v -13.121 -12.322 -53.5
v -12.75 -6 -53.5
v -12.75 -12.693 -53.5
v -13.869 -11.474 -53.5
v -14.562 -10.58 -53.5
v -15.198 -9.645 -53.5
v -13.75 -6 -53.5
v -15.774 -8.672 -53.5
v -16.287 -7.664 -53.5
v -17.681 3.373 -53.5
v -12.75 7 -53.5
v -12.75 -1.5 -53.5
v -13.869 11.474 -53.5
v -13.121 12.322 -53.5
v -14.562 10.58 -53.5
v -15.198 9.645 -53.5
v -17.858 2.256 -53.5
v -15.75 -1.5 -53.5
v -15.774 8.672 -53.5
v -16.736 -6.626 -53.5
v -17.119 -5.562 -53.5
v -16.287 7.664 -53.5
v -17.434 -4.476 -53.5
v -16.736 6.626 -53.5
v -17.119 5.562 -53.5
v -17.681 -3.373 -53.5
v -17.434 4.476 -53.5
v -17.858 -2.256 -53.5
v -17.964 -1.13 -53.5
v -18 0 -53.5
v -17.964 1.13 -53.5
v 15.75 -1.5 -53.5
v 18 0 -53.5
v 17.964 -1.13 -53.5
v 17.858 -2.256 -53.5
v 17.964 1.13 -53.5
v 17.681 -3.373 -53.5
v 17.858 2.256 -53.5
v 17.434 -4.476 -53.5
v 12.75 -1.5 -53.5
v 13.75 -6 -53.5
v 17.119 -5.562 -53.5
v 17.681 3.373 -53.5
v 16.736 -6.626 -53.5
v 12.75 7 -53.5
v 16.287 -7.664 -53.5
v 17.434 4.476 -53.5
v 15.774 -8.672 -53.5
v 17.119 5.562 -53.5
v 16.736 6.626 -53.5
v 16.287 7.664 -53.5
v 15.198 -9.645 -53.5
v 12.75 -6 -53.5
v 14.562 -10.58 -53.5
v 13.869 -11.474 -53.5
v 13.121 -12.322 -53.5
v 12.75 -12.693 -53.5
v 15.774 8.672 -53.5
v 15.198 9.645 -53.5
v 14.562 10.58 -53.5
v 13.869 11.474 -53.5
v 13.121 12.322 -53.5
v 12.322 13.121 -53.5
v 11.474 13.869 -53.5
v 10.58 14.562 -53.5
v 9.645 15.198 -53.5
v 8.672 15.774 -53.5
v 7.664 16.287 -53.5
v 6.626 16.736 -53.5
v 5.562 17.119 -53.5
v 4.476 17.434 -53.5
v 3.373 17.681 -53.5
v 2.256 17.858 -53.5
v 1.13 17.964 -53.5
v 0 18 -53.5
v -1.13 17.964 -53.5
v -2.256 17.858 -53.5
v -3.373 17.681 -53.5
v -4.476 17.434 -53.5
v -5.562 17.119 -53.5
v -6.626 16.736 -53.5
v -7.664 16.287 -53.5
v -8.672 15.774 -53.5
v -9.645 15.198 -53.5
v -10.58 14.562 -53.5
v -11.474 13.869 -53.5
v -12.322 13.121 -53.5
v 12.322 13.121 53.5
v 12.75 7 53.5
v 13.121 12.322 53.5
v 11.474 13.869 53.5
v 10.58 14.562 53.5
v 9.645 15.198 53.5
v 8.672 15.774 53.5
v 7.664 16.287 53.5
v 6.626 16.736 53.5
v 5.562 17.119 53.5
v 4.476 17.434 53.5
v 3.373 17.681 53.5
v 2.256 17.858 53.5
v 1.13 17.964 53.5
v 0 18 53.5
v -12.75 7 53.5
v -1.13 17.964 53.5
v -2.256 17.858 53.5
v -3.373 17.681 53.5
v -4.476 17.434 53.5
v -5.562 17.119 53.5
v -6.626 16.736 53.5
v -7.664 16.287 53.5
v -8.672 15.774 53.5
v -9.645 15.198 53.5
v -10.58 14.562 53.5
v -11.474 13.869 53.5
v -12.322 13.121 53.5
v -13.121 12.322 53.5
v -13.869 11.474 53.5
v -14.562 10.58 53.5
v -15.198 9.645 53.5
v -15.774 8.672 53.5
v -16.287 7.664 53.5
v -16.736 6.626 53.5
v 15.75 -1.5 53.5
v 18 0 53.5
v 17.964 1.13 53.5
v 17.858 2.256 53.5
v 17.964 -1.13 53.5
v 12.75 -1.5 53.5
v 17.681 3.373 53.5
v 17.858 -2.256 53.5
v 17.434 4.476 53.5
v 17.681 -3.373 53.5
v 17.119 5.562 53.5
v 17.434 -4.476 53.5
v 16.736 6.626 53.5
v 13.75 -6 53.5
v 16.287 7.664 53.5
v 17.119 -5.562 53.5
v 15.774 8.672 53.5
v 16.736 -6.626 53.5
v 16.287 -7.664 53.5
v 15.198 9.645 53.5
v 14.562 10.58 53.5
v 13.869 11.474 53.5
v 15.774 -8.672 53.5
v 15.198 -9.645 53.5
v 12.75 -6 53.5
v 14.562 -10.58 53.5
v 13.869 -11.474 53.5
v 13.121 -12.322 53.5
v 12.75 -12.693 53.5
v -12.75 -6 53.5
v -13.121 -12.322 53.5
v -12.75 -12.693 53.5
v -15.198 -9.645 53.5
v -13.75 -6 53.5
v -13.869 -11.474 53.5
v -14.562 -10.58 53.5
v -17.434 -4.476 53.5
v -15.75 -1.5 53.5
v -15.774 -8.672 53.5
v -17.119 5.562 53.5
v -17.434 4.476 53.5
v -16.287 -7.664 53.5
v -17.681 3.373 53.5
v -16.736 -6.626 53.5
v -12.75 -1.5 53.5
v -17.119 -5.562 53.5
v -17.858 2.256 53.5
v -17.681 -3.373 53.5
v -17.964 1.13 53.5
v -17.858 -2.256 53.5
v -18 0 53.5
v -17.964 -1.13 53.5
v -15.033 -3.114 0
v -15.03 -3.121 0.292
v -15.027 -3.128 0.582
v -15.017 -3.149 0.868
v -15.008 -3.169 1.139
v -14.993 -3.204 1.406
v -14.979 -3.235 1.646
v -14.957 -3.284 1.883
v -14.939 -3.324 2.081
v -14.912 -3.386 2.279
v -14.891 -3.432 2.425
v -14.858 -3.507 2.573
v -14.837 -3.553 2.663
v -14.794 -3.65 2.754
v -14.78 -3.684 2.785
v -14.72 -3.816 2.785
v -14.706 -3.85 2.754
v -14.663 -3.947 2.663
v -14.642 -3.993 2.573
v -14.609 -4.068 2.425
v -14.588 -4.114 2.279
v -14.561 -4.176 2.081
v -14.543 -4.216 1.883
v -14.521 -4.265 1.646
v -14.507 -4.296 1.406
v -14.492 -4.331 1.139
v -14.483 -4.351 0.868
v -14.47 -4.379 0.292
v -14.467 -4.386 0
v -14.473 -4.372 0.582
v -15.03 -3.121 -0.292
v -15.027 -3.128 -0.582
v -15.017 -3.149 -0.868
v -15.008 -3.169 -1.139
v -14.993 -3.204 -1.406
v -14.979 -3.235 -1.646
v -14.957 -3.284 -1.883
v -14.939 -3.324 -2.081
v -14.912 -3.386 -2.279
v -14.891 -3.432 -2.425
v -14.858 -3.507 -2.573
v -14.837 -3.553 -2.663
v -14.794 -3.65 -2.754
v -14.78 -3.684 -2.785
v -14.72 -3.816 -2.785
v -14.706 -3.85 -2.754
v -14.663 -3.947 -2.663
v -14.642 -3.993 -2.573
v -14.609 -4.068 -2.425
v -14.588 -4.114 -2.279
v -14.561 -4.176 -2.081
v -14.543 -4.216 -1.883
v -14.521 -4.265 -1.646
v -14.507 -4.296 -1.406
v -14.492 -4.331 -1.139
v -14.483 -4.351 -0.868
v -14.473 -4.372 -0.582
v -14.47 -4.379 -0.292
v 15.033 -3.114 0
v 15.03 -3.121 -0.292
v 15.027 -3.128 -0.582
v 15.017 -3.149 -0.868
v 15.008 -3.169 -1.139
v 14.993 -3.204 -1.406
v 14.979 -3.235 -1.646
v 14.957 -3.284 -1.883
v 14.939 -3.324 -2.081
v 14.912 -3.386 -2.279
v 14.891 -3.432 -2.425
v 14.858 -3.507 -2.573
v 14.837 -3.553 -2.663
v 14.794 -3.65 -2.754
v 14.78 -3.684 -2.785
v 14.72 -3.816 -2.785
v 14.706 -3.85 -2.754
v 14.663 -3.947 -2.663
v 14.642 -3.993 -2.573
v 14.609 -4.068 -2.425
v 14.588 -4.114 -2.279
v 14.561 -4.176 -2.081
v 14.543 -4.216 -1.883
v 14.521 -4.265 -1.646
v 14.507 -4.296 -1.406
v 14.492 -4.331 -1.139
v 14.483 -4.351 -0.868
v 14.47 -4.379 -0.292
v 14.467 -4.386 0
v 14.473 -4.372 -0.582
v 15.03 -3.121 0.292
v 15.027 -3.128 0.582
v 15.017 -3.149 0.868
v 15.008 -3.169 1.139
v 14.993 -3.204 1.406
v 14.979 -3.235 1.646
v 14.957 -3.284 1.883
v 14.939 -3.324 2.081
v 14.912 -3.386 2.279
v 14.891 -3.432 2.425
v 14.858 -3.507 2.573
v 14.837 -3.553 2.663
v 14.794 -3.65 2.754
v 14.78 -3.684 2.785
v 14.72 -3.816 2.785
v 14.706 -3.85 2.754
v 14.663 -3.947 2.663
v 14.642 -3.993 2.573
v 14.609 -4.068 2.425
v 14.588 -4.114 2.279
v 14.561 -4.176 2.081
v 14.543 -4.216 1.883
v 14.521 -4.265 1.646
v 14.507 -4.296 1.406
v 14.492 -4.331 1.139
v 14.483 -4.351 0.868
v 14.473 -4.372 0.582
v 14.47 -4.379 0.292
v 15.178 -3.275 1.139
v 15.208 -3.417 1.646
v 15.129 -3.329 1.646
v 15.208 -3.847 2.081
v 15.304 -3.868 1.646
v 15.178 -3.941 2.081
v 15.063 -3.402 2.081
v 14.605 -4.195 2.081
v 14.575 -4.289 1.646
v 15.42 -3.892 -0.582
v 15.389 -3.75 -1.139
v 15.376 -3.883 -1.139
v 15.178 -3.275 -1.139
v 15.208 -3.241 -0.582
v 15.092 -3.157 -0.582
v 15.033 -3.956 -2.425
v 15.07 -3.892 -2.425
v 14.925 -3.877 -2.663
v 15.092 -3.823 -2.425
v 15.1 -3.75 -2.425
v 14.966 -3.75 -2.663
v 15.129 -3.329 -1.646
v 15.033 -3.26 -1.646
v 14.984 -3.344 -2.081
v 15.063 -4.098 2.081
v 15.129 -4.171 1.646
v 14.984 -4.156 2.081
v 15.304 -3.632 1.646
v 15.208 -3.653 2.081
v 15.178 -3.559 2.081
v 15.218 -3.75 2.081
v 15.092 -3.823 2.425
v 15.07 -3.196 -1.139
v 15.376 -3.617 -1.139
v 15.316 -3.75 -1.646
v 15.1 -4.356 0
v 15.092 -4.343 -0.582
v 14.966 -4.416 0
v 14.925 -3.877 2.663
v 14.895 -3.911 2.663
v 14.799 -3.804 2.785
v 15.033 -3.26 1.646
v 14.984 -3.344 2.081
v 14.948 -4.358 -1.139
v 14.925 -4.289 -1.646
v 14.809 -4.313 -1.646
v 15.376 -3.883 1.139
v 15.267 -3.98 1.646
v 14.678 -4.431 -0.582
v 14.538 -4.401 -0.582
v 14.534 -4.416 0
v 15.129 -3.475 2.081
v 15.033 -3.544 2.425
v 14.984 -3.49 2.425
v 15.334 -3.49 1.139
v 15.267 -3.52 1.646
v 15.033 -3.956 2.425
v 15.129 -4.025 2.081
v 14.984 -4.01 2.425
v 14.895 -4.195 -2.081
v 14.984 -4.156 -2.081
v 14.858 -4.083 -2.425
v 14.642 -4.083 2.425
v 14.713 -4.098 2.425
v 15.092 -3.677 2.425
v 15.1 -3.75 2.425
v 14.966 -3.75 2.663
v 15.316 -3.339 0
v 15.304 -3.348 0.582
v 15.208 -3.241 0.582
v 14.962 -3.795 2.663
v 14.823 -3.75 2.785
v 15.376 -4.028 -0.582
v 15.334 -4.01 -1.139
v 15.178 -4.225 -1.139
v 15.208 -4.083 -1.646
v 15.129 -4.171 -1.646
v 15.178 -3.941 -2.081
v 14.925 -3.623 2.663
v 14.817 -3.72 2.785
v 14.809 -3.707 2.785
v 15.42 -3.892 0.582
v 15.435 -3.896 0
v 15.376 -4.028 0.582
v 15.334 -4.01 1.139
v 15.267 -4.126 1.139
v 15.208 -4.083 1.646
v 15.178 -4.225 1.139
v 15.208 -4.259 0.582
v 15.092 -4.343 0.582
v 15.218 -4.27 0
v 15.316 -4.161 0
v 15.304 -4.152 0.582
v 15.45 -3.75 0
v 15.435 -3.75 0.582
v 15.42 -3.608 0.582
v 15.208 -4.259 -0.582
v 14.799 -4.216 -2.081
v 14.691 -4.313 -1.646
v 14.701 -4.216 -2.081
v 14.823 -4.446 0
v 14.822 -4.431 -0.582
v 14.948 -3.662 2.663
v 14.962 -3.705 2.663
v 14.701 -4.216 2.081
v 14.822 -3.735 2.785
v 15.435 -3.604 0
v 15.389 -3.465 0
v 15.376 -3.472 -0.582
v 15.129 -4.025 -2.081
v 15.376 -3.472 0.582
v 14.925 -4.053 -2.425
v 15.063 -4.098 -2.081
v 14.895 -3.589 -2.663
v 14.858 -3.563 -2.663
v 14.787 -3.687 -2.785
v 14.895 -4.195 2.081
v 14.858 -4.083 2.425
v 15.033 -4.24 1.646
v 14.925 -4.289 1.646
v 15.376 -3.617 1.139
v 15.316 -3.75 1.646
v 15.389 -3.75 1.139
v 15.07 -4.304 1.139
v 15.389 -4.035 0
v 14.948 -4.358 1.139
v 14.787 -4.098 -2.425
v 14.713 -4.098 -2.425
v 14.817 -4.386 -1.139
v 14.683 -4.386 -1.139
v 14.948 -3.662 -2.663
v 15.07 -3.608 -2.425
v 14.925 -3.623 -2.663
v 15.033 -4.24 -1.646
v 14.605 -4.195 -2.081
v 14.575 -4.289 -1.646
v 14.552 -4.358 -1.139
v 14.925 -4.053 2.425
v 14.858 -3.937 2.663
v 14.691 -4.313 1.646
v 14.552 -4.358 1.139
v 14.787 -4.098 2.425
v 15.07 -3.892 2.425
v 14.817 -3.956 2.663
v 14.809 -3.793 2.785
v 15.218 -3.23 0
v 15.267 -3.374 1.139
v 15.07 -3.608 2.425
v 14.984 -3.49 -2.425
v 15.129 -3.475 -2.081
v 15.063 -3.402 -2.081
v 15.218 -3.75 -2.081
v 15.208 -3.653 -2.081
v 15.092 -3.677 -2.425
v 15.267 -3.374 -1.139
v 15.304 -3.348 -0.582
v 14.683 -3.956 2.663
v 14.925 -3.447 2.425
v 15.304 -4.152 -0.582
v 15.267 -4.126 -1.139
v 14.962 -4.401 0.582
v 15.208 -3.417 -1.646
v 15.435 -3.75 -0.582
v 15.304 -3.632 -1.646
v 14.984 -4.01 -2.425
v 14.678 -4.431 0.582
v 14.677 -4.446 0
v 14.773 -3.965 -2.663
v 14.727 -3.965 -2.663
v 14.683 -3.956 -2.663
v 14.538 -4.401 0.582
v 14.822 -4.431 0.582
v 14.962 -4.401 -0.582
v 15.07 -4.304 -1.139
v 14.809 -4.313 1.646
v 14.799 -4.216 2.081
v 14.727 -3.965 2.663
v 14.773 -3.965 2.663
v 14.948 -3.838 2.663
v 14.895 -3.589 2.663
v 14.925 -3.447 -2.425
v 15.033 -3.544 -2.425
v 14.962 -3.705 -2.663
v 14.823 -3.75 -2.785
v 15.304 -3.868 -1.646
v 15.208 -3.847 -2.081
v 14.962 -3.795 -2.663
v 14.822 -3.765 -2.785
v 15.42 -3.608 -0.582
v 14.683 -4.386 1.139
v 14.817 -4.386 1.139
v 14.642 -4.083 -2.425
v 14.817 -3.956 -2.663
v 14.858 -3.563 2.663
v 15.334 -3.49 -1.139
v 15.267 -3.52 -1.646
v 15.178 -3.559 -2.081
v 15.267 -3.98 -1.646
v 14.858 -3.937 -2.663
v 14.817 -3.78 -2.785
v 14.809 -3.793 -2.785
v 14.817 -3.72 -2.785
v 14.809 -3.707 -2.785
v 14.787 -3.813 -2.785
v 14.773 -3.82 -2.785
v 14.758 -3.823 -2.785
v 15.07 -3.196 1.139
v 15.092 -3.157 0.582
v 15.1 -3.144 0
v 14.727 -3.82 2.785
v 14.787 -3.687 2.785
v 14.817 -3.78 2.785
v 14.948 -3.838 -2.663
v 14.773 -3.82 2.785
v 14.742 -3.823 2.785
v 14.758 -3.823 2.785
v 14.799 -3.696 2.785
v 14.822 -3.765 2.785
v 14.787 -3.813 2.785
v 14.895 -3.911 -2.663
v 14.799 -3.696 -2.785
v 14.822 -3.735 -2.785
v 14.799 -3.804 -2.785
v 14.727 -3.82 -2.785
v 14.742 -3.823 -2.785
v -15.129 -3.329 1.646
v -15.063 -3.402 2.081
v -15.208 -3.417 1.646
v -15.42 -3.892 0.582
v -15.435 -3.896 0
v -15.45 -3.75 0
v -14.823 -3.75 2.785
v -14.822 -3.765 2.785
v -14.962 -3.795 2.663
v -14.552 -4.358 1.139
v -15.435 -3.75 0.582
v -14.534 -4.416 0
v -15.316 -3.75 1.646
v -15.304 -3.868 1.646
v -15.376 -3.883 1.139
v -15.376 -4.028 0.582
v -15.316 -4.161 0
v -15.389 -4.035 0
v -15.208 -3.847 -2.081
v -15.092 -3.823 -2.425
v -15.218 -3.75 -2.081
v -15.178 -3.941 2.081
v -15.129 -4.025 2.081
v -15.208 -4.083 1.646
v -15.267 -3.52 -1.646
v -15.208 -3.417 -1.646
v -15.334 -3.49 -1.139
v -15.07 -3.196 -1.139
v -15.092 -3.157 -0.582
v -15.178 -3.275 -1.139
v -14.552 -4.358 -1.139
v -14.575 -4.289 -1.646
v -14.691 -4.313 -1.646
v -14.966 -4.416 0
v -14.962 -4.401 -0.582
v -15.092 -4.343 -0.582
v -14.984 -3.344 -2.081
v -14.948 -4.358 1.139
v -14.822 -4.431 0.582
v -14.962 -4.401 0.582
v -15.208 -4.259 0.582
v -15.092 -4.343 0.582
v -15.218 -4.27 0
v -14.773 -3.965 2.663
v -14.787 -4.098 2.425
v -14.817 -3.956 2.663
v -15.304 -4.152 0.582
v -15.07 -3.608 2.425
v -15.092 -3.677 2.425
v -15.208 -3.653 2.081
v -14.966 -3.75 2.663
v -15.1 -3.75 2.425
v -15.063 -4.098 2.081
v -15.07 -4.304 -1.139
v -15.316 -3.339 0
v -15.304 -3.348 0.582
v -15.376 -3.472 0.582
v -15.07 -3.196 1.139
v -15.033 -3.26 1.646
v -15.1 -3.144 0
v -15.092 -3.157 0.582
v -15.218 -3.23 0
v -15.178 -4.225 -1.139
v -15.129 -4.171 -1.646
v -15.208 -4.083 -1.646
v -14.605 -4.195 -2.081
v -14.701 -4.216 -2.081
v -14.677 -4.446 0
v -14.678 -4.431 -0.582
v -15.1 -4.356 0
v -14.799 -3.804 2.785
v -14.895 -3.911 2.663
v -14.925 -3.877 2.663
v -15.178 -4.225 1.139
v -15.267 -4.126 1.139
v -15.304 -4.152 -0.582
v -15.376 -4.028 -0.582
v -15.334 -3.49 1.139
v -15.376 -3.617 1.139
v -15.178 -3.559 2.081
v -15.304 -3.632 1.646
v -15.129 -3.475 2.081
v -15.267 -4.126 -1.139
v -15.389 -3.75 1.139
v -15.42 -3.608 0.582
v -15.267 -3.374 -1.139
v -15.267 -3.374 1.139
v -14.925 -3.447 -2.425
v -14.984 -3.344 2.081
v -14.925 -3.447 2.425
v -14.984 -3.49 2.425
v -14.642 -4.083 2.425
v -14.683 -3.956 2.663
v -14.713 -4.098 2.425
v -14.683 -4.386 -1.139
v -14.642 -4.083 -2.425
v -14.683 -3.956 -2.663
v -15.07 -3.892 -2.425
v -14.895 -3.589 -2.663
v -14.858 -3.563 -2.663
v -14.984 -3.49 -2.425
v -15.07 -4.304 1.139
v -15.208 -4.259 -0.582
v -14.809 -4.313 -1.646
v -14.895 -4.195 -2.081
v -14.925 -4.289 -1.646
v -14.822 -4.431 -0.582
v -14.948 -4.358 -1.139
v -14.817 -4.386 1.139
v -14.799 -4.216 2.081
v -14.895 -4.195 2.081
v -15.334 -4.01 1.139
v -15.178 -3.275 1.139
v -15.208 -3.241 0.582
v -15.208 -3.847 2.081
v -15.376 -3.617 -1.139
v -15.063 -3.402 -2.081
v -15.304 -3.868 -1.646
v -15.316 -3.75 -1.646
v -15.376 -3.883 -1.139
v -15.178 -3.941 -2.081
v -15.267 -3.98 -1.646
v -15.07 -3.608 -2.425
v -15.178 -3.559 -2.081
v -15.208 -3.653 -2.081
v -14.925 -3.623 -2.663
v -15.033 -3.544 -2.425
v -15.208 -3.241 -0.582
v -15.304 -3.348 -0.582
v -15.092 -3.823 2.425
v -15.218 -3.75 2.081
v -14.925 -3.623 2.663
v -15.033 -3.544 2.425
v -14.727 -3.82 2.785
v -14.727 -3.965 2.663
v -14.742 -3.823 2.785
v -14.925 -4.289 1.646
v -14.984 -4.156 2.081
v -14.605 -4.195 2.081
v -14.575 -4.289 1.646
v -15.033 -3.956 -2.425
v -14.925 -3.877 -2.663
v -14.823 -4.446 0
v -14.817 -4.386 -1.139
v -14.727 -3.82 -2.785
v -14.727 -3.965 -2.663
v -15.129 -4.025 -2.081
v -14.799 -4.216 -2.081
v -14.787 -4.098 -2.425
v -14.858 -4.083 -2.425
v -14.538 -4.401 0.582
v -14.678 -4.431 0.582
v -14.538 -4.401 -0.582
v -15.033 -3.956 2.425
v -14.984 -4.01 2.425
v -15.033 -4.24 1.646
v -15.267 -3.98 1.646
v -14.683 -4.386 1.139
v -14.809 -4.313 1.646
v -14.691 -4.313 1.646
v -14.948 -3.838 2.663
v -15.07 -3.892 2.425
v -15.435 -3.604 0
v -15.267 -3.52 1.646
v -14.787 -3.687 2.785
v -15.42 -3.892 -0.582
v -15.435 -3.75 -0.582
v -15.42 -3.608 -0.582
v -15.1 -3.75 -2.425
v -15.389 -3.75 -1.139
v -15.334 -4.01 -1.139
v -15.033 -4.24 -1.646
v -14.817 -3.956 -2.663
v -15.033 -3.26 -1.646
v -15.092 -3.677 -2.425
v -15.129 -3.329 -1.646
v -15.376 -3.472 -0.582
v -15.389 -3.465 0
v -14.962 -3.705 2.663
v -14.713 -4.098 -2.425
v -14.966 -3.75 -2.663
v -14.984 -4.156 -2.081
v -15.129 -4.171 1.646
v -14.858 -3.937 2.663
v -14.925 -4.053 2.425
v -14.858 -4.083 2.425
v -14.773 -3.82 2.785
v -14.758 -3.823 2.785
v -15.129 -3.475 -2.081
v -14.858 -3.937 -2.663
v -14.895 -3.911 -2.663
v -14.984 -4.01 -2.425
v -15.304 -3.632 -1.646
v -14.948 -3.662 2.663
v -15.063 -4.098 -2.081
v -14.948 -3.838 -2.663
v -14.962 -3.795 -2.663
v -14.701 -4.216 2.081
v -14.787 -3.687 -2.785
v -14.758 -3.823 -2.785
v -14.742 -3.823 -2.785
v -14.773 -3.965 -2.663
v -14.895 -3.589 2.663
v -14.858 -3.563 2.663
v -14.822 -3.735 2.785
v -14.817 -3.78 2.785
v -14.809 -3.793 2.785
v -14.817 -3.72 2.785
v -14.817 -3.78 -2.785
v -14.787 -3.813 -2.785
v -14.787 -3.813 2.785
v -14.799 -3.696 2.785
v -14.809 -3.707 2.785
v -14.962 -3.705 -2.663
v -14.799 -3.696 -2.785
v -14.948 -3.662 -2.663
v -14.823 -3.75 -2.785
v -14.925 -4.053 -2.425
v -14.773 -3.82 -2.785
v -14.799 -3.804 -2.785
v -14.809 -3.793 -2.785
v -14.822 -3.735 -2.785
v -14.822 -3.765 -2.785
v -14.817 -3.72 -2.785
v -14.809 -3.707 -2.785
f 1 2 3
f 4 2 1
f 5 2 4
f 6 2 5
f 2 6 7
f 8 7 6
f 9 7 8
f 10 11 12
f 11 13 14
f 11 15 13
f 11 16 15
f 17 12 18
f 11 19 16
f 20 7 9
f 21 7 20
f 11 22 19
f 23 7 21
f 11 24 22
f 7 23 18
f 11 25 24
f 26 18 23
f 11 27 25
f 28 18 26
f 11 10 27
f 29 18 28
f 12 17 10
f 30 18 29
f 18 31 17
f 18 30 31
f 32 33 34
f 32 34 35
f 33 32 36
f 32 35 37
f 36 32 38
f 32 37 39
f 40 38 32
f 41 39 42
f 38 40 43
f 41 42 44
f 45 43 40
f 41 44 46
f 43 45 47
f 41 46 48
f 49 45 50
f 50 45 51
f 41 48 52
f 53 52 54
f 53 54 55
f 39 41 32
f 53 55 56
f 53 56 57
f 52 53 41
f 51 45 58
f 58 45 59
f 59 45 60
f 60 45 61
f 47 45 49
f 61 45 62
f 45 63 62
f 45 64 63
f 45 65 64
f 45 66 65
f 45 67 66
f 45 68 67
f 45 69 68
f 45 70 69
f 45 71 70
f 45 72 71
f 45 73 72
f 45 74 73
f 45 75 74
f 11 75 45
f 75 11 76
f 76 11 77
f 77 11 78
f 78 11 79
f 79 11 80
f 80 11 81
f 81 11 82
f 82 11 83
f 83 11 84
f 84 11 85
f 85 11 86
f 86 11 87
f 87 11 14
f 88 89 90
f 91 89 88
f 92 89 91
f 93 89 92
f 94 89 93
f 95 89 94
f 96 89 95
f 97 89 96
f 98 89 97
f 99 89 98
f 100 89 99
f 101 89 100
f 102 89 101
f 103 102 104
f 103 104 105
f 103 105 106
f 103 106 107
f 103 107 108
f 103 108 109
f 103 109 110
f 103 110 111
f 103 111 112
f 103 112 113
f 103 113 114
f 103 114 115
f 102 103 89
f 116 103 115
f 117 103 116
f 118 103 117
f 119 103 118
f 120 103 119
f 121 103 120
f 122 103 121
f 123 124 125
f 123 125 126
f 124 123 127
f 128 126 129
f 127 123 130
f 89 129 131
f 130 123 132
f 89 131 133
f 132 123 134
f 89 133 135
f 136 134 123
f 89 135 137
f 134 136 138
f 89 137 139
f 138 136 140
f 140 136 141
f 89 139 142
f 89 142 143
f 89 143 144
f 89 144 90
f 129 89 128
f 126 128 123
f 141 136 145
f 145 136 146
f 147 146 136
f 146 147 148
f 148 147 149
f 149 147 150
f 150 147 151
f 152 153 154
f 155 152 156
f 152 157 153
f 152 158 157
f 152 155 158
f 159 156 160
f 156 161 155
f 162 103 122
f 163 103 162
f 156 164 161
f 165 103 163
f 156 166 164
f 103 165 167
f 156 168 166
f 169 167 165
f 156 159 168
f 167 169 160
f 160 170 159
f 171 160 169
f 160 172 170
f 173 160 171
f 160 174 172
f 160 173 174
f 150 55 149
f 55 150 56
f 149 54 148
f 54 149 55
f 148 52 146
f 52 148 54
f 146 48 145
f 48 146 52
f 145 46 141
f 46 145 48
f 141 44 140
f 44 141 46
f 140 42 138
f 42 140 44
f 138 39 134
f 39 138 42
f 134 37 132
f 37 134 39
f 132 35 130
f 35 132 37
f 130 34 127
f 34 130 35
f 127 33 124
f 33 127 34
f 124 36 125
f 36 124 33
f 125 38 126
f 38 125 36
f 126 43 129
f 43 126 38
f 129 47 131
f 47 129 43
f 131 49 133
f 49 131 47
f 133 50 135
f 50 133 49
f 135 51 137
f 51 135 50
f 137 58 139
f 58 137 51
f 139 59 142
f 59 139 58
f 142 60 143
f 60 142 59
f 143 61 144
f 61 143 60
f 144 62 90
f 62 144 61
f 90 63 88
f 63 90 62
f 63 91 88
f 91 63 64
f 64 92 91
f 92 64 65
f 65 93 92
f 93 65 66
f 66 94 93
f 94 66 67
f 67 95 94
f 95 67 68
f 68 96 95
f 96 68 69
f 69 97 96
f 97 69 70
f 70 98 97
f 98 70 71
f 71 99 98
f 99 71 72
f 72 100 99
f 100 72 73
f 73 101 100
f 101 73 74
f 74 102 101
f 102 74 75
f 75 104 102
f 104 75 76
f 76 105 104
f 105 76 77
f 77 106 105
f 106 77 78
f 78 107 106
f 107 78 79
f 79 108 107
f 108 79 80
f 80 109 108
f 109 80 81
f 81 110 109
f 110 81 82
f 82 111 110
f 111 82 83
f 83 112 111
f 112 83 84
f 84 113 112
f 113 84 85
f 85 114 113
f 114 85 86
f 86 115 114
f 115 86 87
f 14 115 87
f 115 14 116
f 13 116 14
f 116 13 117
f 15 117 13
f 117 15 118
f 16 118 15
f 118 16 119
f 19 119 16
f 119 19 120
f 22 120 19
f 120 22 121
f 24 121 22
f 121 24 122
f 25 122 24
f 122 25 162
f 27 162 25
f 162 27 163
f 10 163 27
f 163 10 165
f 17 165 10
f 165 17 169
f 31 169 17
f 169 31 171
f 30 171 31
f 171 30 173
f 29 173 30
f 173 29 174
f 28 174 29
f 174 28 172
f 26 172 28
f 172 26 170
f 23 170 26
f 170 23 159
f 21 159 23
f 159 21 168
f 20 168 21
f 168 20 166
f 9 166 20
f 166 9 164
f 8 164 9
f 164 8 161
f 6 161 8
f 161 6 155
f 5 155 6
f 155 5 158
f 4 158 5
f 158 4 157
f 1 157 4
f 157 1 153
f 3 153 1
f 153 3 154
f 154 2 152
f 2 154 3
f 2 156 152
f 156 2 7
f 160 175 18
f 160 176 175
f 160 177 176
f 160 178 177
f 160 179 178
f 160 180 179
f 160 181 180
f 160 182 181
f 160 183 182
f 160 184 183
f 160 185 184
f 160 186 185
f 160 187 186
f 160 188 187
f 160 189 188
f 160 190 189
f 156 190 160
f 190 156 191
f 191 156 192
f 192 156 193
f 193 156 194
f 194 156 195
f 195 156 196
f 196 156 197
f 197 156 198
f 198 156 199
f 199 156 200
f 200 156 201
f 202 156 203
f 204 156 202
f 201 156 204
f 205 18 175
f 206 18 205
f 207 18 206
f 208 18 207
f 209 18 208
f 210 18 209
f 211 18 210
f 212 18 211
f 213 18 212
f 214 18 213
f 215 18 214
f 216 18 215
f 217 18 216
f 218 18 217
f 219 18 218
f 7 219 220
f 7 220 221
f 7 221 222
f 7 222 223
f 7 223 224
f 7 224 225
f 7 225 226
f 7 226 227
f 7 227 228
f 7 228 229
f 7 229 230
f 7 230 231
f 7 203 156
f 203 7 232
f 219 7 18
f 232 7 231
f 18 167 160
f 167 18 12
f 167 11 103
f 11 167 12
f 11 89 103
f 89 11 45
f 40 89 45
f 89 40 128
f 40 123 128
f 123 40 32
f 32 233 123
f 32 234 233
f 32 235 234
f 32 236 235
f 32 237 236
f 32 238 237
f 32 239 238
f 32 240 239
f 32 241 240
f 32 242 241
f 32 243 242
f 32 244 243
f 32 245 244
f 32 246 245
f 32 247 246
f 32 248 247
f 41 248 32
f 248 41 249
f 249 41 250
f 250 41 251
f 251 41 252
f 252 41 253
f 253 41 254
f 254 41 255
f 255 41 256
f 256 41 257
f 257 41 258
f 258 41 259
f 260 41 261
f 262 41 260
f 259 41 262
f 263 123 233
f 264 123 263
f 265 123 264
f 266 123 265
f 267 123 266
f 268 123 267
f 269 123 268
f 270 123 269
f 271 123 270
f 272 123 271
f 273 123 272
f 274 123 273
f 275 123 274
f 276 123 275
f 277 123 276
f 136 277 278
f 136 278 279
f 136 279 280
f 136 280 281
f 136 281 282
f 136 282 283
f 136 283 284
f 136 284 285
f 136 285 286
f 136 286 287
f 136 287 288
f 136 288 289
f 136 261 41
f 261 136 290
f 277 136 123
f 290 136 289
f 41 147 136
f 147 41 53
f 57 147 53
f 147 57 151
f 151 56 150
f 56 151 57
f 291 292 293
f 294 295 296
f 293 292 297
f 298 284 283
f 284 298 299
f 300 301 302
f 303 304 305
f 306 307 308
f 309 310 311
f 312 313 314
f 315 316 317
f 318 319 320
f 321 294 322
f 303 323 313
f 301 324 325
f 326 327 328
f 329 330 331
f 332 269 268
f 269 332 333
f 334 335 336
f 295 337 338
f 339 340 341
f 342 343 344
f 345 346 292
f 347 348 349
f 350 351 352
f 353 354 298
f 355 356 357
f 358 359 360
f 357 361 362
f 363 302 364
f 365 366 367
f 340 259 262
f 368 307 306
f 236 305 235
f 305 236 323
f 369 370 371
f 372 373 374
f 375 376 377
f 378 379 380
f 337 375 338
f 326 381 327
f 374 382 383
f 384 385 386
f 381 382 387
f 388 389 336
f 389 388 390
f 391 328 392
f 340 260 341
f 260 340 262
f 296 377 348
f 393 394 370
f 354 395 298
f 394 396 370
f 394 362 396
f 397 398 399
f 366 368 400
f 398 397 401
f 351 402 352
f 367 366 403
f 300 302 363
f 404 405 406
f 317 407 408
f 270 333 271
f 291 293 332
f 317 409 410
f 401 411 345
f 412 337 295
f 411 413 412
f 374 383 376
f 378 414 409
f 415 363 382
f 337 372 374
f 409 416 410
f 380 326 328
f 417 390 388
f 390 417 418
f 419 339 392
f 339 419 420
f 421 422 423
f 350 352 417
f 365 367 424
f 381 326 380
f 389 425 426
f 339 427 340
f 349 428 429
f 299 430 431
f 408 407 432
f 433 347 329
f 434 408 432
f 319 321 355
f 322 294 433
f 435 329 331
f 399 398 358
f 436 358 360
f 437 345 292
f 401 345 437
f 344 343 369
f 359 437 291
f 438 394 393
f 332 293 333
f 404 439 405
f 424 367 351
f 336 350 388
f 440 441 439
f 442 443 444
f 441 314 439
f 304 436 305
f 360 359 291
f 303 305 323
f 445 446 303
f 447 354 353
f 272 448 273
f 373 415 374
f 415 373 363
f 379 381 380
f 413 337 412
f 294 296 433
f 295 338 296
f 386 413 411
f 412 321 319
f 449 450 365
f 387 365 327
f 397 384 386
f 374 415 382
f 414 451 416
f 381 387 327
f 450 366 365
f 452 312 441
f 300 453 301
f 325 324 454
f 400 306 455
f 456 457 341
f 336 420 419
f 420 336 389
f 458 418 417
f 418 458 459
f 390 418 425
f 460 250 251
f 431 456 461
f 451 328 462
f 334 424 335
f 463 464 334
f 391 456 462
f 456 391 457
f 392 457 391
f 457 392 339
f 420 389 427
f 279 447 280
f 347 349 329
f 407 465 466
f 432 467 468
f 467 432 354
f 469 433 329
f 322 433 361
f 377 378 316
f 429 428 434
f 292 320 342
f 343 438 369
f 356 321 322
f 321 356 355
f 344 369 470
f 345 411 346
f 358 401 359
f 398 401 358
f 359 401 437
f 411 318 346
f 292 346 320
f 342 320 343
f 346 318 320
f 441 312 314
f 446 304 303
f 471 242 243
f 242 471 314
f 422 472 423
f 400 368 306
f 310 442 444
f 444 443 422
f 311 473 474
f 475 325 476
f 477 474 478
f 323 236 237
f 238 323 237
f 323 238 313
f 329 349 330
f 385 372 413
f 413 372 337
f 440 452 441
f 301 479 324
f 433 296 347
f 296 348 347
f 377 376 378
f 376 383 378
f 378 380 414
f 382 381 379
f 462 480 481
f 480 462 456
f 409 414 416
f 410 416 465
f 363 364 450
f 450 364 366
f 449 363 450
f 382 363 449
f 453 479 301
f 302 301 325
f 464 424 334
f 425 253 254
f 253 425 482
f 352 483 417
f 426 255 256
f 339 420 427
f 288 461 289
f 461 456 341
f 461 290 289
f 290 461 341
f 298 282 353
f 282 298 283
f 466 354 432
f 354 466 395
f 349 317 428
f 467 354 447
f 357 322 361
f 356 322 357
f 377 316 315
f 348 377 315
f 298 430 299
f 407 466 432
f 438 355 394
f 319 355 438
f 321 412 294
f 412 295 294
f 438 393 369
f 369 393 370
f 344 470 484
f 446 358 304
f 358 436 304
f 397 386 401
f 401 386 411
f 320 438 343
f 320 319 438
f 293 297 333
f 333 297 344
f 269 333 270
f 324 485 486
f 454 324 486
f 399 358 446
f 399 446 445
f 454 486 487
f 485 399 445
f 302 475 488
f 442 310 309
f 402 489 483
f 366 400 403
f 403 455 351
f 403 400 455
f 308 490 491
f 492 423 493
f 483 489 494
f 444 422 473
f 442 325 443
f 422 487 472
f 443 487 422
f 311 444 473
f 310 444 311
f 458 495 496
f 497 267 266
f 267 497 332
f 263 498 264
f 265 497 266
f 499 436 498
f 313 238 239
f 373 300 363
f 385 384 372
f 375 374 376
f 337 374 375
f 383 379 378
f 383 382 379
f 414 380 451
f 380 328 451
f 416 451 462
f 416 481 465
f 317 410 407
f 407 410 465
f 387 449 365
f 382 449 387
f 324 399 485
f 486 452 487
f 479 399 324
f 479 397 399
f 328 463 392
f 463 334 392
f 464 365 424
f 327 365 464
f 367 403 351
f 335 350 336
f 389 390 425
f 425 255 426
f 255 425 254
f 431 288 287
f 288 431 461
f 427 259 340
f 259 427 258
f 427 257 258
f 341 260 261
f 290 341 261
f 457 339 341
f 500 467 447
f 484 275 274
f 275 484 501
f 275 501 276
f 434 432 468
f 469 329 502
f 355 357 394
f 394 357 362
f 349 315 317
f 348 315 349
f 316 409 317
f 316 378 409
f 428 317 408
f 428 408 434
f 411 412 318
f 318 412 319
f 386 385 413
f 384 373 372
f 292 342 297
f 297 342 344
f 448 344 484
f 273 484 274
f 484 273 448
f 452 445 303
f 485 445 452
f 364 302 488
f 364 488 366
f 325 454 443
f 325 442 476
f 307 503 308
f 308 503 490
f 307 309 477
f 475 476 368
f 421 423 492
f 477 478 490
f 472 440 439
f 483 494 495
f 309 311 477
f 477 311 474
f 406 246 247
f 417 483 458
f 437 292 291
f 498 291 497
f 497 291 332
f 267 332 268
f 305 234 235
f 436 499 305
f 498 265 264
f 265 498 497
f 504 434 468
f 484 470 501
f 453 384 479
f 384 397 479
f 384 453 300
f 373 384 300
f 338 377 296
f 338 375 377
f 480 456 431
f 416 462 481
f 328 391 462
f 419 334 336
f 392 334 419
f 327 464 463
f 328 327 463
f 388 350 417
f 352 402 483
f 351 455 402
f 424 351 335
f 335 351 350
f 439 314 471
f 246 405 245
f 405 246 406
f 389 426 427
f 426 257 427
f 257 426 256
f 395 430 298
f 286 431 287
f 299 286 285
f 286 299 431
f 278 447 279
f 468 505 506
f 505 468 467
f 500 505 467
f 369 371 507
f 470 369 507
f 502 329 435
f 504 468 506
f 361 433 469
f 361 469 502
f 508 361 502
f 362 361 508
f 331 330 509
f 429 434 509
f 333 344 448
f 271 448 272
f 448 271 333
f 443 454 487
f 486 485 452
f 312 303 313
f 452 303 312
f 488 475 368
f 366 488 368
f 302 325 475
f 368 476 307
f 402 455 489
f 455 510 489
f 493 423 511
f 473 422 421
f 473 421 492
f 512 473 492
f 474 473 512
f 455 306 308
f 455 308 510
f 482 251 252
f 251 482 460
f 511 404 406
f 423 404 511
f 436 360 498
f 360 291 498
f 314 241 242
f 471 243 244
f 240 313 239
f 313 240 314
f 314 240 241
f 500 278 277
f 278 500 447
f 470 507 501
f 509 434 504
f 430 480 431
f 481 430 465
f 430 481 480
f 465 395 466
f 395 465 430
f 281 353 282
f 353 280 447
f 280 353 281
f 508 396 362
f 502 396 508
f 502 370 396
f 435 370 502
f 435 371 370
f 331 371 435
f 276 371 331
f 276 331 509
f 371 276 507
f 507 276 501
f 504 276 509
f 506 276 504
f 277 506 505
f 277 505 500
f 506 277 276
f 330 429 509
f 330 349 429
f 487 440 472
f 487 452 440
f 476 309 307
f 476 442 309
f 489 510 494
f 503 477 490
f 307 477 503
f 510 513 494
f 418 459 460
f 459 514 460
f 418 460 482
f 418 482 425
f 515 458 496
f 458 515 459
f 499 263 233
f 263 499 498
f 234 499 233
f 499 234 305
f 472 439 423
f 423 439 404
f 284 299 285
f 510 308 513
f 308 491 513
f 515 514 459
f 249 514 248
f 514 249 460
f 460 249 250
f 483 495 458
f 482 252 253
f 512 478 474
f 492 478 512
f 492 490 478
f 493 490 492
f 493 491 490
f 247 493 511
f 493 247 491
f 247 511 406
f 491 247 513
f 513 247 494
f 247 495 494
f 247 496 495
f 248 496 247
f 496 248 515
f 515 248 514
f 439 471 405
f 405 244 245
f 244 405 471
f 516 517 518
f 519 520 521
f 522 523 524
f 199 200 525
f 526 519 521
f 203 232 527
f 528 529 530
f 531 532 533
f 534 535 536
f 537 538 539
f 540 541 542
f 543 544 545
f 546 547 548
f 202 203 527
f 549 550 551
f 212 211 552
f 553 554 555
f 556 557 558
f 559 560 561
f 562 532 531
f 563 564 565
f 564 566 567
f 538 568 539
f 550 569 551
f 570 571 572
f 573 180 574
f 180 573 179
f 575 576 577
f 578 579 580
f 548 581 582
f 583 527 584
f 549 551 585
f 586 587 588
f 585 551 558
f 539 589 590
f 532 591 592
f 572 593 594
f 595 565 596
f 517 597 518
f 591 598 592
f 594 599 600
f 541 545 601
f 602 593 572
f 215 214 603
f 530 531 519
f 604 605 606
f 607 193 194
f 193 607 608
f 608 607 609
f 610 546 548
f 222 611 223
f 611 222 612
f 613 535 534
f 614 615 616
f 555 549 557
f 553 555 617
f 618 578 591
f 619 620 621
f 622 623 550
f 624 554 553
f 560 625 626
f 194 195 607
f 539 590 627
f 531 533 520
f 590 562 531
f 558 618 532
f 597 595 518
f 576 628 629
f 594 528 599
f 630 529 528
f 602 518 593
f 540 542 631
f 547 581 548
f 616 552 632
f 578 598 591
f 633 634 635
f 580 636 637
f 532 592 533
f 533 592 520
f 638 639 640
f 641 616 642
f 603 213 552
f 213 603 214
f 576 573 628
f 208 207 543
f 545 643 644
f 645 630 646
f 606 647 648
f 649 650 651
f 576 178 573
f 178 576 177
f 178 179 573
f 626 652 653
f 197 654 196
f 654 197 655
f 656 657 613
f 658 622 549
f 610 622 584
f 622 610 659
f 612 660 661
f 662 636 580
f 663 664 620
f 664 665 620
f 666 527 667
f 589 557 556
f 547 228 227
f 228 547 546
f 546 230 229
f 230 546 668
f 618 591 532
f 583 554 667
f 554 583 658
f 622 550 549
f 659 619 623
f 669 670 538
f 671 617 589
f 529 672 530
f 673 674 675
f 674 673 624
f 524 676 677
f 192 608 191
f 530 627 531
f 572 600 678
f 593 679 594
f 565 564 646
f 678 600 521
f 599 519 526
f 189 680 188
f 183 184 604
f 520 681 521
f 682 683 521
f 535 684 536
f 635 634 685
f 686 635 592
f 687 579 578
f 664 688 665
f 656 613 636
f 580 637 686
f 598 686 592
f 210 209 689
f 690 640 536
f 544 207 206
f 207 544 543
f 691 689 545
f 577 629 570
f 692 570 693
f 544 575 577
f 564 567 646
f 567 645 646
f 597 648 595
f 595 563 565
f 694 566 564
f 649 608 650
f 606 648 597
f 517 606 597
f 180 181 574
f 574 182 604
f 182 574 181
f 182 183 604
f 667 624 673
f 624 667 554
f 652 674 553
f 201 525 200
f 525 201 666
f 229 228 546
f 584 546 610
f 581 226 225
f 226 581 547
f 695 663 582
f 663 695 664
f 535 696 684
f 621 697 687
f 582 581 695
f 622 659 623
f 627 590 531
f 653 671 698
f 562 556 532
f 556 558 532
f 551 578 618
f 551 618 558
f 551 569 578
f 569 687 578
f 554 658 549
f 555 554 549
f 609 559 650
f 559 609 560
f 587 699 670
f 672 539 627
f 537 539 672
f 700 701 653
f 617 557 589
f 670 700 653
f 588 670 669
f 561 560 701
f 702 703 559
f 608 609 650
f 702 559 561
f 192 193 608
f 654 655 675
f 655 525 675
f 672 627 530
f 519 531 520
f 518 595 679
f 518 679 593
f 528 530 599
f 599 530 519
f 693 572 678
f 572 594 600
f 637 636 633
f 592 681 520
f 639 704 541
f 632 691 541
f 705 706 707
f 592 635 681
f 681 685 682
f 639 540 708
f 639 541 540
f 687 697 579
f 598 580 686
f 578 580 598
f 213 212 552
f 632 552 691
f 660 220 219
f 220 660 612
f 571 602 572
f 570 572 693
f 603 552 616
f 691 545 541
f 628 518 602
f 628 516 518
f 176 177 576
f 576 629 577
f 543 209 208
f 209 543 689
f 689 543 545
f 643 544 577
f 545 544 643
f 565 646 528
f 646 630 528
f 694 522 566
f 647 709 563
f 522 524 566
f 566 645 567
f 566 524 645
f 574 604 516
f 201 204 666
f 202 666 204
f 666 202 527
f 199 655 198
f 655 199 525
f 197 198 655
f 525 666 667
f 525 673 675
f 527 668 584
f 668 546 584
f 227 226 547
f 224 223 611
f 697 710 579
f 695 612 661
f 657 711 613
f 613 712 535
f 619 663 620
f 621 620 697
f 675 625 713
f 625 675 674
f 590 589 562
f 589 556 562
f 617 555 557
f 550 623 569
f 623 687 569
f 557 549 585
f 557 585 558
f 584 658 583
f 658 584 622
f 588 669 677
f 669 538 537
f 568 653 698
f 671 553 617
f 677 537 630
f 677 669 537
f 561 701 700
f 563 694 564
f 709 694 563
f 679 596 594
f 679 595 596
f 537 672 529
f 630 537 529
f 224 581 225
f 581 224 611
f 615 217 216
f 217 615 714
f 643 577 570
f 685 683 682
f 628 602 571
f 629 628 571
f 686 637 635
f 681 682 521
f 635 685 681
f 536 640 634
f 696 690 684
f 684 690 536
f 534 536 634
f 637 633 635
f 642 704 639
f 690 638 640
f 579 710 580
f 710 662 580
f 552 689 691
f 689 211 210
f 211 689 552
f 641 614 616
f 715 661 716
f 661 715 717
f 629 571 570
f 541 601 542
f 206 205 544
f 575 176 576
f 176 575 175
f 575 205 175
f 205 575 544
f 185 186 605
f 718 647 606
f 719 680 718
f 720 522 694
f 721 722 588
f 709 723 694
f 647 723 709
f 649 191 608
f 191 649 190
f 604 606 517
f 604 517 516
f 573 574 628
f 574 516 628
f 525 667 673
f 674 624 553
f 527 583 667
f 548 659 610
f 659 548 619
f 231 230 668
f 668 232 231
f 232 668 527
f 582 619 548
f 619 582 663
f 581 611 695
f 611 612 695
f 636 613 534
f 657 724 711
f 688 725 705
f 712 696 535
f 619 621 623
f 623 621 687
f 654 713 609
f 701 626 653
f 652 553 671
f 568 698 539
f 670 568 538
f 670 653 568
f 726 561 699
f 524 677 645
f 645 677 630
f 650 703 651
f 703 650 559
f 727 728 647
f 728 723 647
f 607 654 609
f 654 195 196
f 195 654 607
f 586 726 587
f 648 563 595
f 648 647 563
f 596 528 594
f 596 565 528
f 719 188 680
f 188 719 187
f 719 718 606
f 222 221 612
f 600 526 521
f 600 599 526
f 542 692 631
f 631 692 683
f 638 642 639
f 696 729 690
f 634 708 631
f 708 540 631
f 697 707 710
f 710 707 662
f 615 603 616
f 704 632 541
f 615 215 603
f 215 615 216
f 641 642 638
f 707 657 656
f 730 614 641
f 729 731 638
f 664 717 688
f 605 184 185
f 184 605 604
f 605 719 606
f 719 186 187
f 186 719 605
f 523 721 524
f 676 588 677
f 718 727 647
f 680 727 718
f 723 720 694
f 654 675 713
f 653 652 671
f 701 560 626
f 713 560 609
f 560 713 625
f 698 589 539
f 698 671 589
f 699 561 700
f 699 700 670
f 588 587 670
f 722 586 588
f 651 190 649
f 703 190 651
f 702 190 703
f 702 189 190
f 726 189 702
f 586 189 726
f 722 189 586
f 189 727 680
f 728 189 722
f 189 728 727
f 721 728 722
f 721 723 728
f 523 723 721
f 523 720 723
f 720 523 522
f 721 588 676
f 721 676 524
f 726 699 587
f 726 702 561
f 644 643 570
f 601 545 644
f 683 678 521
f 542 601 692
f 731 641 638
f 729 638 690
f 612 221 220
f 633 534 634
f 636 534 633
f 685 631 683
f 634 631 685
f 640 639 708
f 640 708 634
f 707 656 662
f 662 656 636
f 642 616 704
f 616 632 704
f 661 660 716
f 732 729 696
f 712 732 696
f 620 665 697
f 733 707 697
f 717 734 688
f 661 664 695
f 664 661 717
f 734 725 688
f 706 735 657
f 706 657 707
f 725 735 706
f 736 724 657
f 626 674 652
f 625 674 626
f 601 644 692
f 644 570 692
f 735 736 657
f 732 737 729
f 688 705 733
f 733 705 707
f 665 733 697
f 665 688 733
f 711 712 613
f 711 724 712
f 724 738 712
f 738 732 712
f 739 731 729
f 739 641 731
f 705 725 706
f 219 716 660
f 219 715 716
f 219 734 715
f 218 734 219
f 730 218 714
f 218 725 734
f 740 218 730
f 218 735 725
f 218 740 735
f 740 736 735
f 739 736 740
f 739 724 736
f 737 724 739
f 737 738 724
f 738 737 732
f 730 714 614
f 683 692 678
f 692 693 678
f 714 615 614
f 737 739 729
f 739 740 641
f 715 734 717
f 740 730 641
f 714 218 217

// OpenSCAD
// --- Sliding Dovetail Clamshell Grip (V14: Self-Locking Angle) ---
// All dimensions in millimeters (mm)

// --- Which part to render? ---
// Options: "assembled", "u_piece", "t_piece"
render_part = "u_piece"; 

// --- 1. Core Dimensions ---
bar_width = 25;
bar_height = 8;
grip_length = 107;
outer_diameter = 36;    

// --- 2. Fit & Clearances ---
bar_tol = 0.5;      
slide_tol = 0.15;   // Perfect middle ground: glides smoothly but doesn't rattle

// Calculated inner channel for the metal bar
inner_w = bar_width + bar_tol;
inner_h = bar_height + bar_tol;
hw = inner_w / 2;

// --- 3. Perfectly Centered Y-Axis Layout ---
bar_top = 7.0;                  
bar_bottom = bar_top - inner_h; 

// --- 4. Dovetail (Angled T-Track) Dimensions ---
wing_top = bar_bottom;          
wing_thickness = 4.5;           // Increased to 4.5mm for massive shear strength
wing_bottom = wing_top - wing_thickness; 

// The Dovetail Angle: Top is wide (3mm), Bottom is narrow (1mm)
wing_depth_top = 3.0;           
wing_depth_bottom = 1.0;        
hgw_top = hw + wing_depth_top;  
hgw_bottom = hw + wing_depth_bottom;

// --- 5. Snap-Fit Detent Settings ---
wing_y_center = (wing_top + wing_bottom) / 2; 
hgw_mid = (hgw_top + hgw_bottom) / 2; // Finds the exact middle of the angled slope
bump_r = 0.6;       
hole_r = 0.7;       

// --- Rendering Logic ---
if (render_part == "assembled") {
    color("dodgerblue") u_piece_3d();
    color("darkorange") translate([0, 0, grip_length/2 + 25]) t_piece_3d();
} else if (render_part == "u_piece") {
    u_piece_3d();
} else if (render_part == "t_piece") {
    t_piece_3d();
}

// --- Modules ---
module u_piece_3d() {
    difference() {
        linear_extrude(height=grip_length, center=true)
        difference() {
            circle(d=outer_diameter, $fn=100);
            
            // The newly angled dovetail cutout
            polygon(points=[
                [-hw, bar_top],                
                [hw, bar_top],                 
                [hw, wing_top],                
                [hgw_top, wing_top],           // Out to WIDE upper wing
                [hgw_bottom, wing_bottom],     // Angled down to NARROW lower wing
                [hw, wing_bottom],             
                [hw, -outer_diameter],         
                [-hw, -outer_diameter],        
                [-hw, wing_bottom],            
                [-hgw_bottom, wing_bottom],    // Angled up to NARROW lower left wing
                [-hgw_top, wing_top],          // Angled up to WIDE upper left wing
                [-hw, wing_top]                
            ]);
        }
        
        // The receiving oval divots on the angled face
        translate([hgw_mid, wing_y_center, 0]) scale([1, 1, 4]) sphere(r=hole_r, $fn=30);
        translate([-hgw_mid, wing_y_center, 0]) scale([1, 1, 4]) sphere(r=hole_r, $fn=30);
    }
}

module t_piece_3d() {
    hw_t = hw - slide_tol;
    hgw_top_t = hgw_top - slide_tol;
    hgw_bottom_t = hgw_bottom - slide_tol;
    wt_t = wing_top - slide_tol;
    wb_t = wing_bottom + slide_tol;
    hgw_mid_t = hgw_mid - slide_tol;
    
    union() {
        linear_extrude(height=grip_length, center=true)
        intersection() {
            circle(d=outer_diameter, $fn=100);
            
            // The solid Dovetail T-piece
            polygon(points=[
                [-hgw_top_t, wt_t],                
                [hgw_top_t, wt_t],                 
                [hgw_bottom_t, wb_t],                 
                [hw_t, wb_t],                  
                [hw_t, -outer_diameter],       
                [-hw_t, -outer_diameter],      
                [-hw_t, wb_t],                 
                [-hgw_bottom_t, wb_t]                 
            ]);
        }
        
        // The locking bumps added to the angled dovetail faces
        translate([hgw_mid_t, wing_y_center, 0]) scale([1, 1, 4]) sphere(r=bump_r, $fn=30);
        translate([-hgw_mid_t, wing_y_center, 0]) scale([1, 1, 4]) sphere(r=bump_r, $fn=30);
    }
}
